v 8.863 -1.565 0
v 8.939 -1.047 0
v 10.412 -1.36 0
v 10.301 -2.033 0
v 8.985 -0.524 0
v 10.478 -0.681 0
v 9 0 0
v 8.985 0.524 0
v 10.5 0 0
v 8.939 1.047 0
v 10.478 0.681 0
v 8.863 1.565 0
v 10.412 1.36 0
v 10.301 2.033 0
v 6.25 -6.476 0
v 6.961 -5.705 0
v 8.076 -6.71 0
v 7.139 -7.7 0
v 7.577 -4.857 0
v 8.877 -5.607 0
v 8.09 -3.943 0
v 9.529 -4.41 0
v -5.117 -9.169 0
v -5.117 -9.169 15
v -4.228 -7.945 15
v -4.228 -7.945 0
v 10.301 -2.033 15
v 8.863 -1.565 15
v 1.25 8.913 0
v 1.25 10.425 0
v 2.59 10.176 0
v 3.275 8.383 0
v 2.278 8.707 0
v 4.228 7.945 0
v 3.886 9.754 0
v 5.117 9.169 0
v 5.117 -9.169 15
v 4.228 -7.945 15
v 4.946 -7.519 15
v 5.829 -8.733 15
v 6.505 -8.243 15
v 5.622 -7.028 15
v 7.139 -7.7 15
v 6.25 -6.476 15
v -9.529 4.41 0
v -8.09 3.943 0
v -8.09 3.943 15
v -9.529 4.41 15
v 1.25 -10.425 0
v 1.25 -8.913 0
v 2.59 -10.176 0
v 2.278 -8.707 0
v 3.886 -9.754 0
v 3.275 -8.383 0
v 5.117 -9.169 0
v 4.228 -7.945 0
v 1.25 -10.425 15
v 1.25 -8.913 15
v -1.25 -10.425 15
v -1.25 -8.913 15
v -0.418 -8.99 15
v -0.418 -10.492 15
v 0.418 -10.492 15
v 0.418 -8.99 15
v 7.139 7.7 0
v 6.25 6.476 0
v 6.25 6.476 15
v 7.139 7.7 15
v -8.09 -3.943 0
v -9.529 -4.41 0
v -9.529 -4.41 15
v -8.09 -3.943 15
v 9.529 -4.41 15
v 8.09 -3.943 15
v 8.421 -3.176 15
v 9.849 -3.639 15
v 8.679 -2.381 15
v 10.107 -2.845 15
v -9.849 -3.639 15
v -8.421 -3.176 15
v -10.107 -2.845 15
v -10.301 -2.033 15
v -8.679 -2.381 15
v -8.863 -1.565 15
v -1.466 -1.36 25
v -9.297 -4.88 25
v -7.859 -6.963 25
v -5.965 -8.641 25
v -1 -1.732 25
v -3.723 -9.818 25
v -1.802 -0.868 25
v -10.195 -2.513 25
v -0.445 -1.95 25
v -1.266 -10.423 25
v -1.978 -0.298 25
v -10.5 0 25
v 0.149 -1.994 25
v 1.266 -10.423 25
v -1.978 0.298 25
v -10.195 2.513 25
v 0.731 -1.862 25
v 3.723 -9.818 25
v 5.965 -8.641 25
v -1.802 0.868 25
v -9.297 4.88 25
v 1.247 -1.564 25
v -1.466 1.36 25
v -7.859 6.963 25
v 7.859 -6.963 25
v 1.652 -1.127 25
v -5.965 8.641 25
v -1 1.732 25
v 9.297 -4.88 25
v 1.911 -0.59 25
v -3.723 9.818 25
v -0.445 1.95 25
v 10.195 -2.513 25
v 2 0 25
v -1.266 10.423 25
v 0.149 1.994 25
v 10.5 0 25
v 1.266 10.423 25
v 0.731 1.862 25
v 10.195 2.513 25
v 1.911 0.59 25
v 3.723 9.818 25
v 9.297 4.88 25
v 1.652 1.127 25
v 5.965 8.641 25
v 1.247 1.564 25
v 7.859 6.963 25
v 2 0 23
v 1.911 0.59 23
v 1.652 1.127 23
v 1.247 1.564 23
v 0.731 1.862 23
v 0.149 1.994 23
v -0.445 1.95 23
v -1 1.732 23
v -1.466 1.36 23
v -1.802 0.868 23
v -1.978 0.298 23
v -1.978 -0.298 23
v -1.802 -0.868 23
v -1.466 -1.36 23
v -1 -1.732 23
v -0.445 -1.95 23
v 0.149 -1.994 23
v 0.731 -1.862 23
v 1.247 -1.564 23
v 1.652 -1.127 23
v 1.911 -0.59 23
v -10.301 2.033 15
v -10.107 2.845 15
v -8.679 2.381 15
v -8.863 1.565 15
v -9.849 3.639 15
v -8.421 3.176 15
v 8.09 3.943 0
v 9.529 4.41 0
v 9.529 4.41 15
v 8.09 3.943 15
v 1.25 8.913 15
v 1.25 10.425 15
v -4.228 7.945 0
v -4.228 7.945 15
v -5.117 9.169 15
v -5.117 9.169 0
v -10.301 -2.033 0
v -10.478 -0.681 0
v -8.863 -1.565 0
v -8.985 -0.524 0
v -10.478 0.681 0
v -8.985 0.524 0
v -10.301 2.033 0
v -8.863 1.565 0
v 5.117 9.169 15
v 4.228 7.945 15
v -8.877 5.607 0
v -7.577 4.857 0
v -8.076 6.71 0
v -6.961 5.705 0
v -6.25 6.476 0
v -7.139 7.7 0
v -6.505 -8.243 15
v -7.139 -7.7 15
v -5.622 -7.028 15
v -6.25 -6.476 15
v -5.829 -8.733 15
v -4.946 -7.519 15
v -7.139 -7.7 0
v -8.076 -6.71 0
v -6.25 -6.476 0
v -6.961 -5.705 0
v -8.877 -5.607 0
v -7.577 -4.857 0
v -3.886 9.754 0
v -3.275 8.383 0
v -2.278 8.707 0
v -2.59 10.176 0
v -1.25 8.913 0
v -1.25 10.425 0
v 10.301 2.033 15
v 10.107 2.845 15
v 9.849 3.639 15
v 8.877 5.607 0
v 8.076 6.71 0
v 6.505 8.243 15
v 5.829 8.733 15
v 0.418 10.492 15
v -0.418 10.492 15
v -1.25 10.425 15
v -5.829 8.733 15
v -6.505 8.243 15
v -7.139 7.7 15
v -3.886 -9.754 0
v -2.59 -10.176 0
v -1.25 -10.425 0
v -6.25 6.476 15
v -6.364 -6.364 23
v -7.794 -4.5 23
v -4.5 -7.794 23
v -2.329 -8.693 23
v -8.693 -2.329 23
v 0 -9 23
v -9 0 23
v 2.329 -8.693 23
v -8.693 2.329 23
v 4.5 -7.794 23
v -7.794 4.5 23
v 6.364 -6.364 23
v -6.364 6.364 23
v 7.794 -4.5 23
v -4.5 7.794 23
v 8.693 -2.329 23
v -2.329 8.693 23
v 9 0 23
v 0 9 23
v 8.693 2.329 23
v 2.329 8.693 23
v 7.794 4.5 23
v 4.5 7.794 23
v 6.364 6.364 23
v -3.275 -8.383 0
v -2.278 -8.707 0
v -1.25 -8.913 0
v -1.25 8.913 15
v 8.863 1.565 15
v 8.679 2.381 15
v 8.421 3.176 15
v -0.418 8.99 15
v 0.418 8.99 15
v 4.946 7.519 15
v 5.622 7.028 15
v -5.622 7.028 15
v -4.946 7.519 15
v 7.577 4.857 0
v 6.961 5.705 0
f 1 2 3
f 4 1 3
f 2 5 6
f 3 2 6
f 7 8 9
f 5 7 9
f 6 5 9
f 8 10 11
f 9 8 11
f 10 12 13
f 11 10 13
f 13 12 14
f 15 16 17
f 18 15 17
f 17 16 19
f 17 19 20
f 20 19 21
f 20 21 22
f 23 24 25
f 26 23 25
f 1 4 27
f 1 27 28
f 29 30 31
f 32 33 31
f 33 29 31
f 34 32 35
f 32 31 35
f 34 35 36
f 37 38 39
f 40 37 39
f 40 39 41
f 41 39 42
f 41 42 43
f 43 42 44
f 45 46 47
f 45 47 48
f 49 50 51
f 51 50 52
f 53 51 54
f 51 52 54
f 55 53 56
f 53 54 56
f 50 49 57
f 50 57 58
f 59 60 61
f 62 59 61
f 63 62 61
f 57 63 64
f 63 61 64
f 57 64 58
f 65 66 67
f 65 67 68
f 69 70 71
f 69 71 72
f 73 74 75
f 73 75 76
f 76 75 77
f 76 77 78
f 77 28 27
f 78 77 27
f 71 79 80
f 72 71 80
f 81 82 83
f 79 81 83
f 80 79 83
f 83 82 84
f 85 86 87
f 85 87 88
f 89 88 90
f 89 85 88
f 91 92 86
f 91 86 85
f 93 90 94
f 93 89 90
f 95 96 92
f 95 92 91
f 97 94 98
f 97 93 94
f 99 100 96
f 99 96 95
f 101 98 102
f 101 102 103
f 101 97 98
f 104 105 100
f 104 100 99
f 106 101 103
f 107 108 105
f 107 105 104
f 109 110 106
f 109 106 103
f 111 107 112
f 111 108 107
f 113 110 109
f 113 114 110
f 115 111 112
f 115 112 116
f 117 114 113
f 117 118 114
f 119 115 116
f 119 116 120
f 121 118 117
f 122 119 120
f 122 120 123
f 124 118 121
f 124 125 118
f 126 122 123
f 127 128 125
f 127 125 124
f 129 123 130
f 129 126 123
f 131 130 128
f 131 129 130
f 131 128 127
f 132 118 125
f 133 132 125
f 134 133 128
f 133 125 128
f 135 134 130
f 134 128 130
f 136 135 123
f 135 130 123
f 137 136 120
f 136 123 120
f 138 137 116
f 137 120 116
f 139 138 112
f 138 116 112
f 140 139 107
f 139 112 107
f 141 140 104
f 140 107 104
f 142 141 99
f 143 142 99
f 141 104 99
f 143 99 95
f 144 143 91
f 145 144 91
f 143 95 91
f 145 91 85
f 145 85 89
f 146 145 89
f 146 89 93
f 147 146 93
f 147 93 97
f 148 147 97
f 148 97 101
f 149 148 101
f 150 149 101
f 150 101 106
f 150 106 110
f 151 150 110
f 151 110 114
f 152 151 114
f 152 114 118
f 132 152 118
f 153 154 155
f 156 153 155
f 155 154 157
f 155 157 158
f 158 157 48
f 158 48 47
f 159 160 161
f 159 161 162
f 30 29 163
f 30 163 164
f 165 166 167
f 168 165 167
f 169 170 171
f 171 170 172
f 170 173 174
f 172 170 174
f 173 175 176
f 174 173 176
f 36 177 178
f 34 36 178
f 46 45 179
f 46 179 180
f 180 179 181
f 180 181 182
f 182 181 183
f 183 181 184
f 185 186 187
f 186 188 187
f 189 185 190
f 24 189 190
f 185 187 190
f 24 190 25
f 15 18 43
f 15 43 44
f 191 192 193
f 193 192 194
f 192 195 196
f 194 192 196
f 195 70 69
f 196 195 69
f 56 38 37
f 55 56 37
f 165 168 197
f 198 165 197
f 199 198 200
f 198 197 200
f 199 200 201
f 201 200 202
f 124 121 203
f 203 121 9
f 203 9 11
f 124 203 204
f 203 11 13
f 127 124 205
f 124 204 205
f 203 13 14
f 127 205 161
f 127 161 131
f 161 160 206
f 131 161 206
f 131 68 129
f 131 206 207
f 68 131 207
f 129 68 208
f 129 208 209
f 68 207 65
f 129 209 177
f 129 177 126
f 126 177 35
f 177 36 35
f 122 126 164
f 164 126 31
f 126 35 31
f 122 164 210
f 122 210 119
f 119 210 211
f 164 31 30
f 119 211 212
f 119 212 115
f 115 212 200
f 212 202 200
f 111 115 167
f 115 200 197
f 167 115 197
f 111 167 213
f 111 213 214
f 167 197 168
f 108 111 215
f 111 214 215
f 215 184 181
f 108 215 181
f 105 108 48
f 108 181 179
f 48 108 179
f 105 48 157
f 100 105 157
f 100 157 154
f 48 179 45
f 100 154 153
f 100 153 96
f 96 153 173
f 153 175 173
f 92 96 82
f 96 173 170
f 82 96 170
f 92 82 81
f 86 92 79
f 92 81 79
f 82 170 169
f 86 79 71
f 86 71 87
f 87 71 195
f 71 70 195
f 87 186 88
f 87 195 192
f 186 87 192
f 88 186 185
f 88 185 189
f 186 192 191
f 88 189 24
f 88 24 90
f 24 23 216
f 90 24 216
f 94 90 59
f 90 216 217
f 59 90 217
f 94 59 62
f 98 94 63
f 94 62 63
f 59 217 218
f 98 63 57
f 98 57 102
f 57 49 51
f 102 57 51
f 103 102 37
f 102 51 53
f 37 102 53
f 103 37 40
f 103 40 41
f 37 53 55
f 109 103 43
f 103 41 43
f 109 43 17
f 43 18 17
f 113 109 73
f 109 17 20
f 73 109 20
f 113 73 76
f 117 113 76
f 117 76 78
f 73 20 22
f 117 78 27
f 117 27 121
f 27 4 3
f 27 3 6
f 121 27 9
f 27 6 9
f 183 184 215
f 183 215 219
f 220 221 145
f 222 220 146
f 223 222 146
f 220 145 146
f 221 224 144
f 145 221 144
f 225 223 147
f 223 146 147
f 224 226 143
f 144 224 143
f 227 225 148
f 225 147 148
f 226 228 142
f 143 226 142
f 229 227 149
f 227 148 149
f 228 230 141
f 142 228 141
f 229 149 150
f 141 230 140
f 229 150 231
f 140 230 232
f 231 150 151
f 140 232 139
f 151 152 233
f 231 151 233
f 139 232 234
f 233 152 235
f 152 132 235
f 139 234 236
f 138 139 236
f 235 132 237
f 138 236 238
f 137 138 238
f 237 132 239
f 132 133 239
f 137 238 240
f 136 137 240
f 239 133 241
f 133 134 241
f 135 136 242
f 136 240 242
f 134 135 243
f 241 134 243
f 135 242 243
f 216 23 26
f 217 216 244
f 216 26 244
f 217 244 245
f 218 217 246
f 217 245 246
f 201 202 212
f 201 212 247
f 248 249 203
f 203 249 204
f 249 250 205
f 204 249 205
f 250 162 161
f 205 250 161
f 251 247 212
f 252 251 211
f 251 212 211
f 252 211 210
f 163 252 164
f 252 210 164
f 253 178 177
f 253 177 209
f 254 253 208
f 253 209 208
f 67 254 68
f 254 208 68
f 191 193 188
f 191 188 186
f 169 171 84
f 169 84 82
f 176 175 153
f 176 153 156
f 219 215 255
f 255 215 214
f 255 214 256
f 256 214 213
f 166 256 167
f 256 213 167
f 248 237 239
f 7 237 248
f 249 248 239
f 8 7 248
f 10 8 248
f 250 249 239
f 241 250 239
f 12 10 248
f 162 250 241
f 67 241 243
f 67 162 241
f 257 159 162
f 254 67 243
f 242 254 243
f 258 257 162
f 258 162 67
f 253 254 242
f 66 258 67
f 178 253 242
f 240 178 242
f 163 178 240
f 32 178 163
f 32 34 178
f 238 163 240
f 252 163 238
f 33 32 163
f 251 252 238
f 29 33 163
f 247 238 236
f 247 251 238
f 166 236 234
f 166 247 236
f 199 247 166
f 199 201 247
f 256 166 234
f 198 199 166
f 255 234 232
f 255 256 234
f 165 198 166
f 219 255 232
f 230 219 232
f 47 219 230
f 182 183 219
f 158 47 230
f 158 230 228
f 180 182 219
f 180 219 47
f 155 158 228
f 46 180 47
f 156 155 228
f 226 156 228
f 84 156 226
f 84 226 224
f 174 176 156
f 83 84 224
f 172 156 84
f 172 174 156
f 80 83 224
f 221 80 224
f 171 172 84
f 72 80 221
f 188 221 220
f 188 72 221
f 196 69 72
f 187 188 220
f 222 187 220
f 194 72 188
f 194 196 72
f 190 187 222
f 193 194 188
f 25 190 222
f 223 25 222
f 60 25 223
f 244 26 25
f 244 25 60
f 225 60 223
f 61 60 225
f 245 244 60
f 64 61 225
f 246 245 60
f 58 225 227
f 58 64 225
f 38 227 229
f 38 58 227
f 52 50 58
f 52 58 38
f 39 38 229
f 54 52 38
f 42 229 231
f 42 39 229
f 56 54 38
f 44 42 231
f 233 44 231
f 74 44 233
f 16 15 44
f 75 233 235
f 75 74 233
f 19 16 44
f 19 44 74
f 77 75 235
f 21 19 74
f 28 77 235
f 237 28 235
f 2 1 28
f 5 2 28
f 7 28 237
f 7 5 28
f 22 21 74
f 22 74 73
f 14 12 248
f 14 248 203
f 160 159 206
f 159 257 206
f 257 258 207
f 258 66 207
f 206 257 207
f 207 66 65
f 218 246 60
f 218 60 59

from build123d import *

# Parameters (mm, degrees)
F0_R     = 10.5
F0_R_2   = 9
F1_DEPTH = 25
F2_DEPTH = 23
F3_R     = 2
F4_DEPTH = 25.001
F6_DEPTH = 15


with BuildPart() as f1:
    # F0 (on Top) → F1 (new body)
    with BuildSketch(Plane.XY):
        Circle(F0_R)
        Circle(F0_R_2, mode=Mode.SUBTRACT)
        Circle(F0_R_2)
    extrude(amount=F1_DEPTH)

    # F0 (on Top) → F2 (cut)
    with BuildSketch(Plane.XY):
        Circle(F0_R_2)
    extrude(amount=F2_DEPTH, mode=Mode.SUBTRACT)

    # F3 (on face) → F4 (cut, through all)
    with BuildSketch(Plane.XY.offset(25)):
        Circle(F3_R)
    extrude(amount=-F4_DEPTH, mode=Mode.SUBTRACT)

    # F5 (on face) → F6 (cut)
    with BuildSketch(Plane.XY):
        with BuildLine():
            Line((6.2500670258, 6.4758522352), (7.1391263091, 7.699537359))
            ThreePointArc((7.1391263091, 7.699537359), (6.1717451491, 8.4946784409), (5.1165838232, 9.1690004897))
            Line((5.1165838232, 9.1690004897), (4.2275245399, 7.945315366))
            ThreePointArc((4.2275245399, 7.945315366), (5.2900672706, 7.2811529494), (6.2500670258, 6.4758522352))
        make_face()
        with BuildLine():
            Line((8.8628208798, 1.5653772877), (10.3013490182, 2.0327834135))
            ThreePointArc((10.3013490182, 2.0327834135), (9.9860934211, 3.2446784409), (9.5288065322, 4.4104247042))
            Line((9.5288065322, 4.4104247042), (8.0902783938, 3.9430185785))
            ThreePointArc((8.0902783938, 3.9430185785), (8.5595086467, 2.7811529494), (8.8628208798, 1.5653772877))
        make_face()
        with BuildLine():
            ThreePointArc((1.25, 10.425329731), (0, 10.5), (-1.25, 10.425329731))
            Line((-1.25, 10.425329731), (-1.25, 8.912771735))
            ThreePointArc((-1.25, 8.912771735), (0, 9), (1.25, 8.912771735))
            Line((1.25, 8.912771735), (1.25, 10.425329731))
        make_face()
        with BuildLine():
            ThreePointArc((-5.1165838232, 9.1690004897), (-6.1717451491, 8.4946784409), (-7.1391263091, 7.699537359))
            Line((-7.1391263091, 7.699537359), (-6.2500670258, 6.4758522352))
            ThreePointArc((-6.2500670258, 6.4758522352), (-5.2900672706, 7.2811529494), (-4.2275245399, 7.945315366))
            Line((-4.2275245399, 7.945315366), (-5.1165838232, 9.1690004897))
        make_face()
        with BuildLine():
            ThreePointArc((-10.3013490182, -2.0327834135), (-9.9860934211, -3.2446784409), (-9.5288065322, -4.4104247042))
            Line((-9.5288065322, -4.4104247042), (-8.0902783938, -3.9430185785))
            ThreePointArc((-8.0902783938, -3.9430185785), (-8.5595086467, -2.7811529494), (-8.8628208798, -1.5653772877))
            Line((-8.8628208798, -1.5653772877), (-10.3013490182, -2.0327834135))
        make_face()
        with BuildLine():
            ThreePointArc((-7.1391263091, -7.699537359), (-6.1717451491, -8.4946784409), (-5.1165838232, -9.1690004897))
            Line((-5.1165838232, -9.1690004897), (-4.2275245399, -7.945315366))
            ThreePointArc((-4.2275245399, -7.945315366), (-5.2900672706, -7.2811529494), (-6.2500670258, -6.4758522352))
            Line((-6.2500670258, -6.4758522352), (-7.1391263091, -7.699537359))
        make_face()
        with BuildLine():
            Line((-1.25, -8.912771735), (-1.25, -10.425329731))
            ThreePointArc((-1.25, -10.425329731), (0, -10.5), (1.25, -10.425329731))
            Line((1.25, -10.425329731), (1.25, -8.912771735))
            ThreePointArc((1.25, -8.912771735), (0, -9), (-1.25, -8.912771735))
        make_face()
        with BuildLine():
            Line((4.2275245399, -7.945315366), (5.1165838232, -9.1690004897))
            ThreePointArc((5.1165838232, -9.1690004897), (6.1717451491, -8.4946784409), (7.1391263091, -7.699537359))
            Line((7.1391263091, -7.699537359), (6.2500670258, -6.4758522352))
            ThreePointArc((6.2500670258, -6.4758522352), (5.2900672706, -7.2811529494), (4.2275245399, -7.945315366))
        make_face()
        with BuildLine():
            ThreePointArc((-9.5288065322, 4.4104247042), (-9.9860934211, 3.2446784409), (-10.3013490182, 2.0327834135))
            Line((-10.3013490182, 2.0327834135), (-8.8628208798, 1.5653772877))
            ThreePointArc((-8.8628208798, 1.5653772877), (-8.5595086467, 2.7811529494), (-8.0902783938, 3.9430185785))
            Line((-8.0902783938, 3.9430185785), (-9.5288065322, 4.4104247042))
        make_face()
        Polygon((-0.7725424859, -1.0633135104), (-0.4774575141, -1.4694631307), (0, -1.3143277803), align=None)
        Polygon((0, -1.3143277803), (0.4774575141, -1.4694631307), (0.7725424859, -1.0633135104), align=None)
        with BuildLine():
            Line((8.0902783938, -3.9430185785), (9.5288065322, -4.4104247042))
            ThreePointArc((9.5288065322, -4.4104247042), (9.9860934211, -3.2446784409), (10.3013490182, -2.0327834135))
            Line((10.3013490182, -2.0327834135), (8.8628208798, -1.5653772877))
            ThreePointArc((8.8628208798, -1.5653772877), (8.5595086467, -2.7811529494), (8.0902783938, -3.9430185785))
        make_face()
    extrude(amount=F6_DEPTH, mode=Mode.SUBTRACT)


solid = f1.part
